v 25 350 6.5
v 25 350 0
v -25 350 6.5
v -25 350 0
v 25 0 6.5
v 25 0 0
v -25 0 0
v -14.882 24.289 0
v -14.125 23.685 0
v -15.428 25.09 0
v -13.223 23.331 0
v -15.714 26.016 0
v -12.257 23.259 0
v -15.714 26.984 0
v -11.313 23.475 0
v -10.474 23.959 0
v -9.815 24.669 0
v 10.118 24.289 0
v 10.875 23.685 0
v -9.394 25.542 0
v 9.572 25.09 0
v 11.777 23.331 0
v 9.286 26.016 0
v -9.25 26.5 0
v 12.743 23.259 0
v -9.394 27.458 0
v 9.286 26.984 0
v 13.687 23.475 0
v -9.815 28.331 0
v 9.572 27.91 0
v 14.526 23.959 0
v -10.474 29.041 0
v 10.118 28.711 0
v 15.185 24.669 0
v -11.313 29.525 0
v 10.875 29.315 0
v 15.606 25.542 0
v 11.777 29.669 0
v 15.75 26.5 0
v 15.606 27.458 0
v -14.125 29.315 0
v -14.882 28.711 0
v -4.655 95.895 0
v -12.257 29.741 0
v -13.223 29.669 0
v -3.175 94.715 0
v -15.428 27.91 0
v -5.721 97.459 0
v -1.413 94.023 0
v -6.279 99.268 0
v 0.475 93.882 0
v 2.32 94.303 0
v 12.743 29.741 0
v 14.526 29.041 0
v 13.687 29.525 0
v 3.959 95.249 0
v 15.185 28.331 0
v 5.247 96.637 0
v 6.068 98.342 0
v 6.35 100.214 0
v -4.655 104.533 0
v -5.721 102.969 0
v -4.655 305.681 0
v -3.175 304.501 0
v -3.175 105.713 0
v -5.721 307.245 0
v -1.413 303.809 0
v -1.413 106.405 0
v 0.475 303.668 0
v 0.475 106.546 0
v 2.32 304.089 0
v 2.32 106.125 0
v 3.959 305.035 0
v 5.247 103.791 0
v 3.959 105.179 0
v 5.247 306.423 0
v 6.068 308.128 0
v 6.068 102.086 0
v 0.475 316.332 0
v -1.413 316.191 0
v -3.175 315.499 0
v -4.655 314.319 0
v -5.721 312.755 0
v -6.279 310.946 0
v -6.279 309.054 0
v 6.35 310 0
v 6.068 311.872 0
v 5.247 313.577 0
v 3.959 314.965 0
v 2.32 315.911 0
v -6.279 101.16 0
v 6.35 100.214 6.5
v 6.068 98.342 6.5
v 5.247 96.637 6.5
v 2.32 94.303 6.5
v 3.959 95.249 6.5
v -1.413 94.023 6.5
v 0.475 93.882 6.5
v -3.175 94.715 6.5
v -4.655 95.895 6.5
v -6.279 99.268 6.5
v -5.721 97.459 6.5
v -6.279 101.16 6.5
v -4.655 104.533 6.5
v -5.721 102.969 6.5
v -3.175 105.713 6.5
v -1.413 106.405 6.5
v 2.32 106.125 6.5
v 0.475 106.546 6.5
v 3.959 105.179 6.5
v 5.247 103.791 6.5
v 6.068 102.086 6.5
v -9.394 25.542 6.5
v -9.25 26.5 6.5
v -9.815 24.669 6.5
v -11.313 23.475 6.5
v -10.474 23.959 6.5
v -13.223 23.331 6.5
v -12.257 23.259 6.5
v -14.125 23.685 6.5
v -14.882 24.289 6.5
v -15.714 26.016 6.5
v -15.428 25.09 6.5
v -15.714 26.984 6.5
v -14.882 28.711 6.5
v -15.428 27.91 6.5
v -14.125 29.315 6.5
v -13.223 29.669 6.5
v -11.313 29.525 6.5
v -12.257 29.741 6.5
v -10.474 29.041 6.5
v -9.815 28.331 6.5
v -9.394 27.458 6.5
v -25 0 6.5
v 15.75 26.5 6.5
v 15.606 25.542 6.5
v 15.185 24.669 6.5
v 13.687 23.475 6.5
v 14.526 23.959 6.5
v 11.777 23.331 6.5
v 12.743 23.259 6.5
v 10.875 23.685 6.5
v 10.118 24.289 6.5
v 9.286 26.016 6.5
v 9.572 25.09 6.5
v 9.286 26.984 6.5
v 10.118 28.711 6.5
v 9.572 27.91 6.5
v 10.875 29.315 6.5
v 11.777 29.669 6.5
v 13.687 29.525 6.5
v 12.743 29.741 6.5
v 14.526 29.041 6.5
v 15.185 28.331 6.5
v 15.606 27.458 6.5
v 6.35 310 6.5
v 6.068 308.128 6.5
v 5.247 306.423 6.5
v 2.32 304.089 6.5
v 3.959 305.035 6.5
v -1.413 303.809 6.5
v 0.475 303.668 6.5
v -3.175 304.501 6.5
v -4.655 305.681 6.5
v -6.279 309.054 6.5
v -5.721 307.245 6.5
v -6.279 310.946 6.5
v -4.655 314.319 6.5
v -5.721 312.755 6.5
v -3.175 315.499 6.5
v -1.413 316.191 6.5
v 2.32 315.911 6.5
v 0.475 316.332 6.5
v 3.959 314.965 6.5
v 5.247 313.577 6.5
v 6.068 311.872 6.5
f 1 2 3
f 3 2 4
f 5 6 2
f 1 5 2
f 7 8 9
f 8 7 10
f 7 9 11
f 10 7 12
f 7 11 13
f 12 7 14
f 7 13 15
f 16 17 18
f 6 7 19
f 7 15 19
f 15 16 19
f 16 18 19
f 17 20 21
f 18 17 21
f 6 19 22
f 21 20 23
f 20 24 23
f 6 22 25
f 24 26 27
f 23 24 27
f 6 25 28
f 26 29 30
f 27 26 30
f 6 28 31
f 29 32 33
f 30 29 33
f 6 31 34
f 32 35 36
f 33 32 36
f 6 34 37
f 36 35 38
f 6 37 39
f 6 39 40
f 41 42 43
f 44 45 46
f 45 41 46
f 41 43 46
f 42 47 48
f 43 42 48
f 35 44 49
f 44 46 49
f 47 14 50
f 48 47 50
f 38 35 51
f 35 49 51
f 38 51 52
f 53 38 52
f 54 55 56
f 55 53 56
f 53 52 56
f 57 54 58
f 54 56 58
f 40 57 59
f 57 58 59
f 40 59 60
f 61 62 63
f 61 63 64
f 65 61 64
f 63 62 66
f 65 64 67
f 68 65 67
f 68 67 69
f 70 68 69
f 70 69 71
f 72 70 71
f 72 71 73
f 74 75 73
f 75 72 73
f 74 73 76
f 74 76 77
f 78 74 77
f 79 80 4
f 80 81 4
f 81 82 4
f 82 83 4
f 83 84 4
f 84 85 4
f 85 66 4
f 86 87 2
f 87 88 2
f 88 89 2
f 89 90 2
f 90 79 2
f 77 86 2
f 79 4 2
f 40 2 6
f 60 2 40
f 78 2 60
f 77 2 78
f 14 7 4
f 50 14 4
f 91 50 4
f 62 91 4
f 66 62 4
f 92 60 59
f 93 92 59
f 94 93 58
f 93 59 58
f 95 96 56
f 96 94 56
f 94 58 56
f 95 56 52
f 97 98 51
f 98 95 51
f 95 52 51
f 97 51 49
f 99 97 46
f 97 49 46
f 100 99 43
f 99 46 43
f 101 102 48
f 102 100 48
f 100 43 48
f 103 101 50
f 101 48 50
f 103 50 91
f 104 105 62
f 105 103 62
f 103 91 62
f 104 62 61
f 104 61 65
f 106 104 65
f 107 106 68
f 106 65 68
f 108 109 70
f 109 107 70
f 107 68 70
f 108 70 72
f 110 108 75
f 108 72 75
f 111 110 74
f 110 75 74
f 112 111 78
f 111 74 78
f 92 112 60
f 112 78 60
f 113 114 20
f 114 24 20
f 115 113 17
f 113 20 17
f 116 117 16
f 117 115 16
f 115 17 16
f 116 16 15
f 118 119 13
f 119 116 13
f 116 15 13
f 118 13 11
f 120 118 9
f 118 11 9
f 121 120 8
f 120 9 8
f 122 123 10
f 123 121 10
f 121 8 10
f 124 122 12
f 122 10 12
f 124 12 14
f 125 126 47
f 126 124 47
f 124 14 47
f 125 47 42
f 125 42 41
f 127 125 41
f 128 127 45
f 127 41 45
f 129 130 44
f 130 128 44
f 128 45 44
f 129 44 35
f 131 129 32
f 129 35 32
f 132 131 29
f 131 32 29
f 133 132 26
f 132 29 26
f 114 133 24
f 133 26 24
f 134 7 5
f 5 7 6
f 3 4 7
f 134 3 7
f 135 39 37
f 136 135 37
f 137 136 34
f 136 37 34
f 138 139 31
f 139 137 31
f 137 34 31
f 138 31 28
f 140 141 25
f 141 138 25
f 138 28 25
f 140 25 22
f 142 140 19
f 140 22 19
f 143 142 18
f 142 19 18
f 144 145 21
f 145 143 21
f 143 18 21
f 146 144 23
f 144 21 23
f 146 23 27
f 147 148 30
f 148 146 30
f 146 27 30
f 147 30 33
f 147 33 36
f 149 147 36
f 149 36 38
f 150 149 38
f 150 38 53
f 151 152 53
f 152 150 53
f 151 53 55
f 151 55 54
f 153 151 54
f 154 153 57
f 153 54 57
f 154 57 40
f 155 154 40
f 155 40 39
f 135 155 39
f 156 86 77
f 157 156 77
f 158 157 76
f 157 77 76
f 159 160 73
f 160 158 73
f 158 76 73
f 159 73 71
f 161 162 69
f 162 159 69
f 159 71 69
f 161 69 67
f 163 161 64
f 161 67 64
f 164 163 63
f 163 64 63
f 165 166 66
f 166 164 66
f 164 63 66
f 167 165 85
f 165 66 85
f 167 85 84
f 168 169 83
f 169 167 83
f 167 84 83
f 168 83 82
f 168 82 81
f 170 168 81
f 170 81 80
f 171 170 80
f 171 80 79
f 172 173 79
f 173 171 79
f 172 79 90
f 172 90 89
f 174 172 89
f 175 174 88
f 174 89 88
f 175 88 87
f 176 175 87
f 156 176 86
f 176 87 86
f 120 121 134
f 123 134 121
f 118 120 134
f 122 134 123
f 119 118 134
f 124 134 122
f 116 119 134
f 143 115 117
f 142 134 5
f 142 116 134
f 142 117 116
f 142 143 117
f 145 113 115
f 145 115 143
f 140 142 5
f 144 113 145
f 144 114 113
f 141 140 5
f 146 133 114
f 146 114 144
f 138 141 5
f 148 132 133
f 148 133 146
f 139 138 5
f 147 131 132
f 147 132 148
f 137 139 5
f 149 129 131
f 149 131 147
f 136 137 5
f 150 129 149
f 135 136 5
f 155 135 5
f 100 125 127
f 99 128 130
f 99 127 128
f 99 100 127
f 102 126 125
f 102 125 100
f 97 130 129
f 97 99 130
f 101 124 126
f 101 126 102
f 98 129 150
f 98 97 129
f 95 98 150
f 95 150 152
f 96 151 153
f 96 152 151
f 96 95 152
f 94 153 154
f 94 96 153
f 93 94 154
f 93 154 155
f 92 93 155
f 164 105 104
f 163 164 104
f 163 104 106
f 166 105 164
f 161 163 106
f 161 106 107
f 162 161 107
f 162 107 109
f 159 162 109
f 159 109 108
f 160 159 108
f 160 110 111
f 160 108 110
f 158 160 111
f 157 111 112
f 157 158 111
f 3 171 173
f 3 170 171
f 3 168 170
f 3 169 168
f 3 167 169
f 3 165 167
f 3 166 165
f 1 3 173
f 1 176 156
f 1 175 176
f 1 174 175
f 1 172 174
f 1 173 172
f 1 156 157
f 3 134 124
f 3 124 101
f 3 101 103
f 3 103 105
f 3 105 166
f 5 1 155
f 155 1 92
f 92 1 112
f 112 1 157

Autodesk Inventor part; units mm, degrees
ref_plane "YZ Plane" through (0, 0, 0) normal (1, 0, 0) x (0, 1, 0)
ref_plane "XZ Plane" through (0, 0, 0) normal (0, 1, 0) x (-1, 0, 0)
ref_plane "XY Plane" through (0, 0, 0) normal (0, 0, 1) x (1, 0, 0)
sketch "Sketch1" plane through (0, 0, 0) normal (0, 0, 1) x (1, 0, 0)
  line L0 (-25, 0) -> (25, 0)
  line L1 (25, 0) -> (25, 350)
  line L2 (25, 350) -> (-25, 350)
  line L3 (-25, 350) -> (-25, 0)
  circle A0 centre (0, 100.214) radius 6.35
  circle A1 centre (0, 310) radius 6.35
  circle A2 centre (-12.5, 26.5) radius 3.25
  circle A3 centre (12.5, 26.5) radius 3.25
  point P0 (0, 0)
  dimension "d0" = 50
  dimension "d1" = 350
  dimension "d2" = 12.7
  dimension "d3" = 12.7
  dimension "d4" = 6.5
  dimension "d5" = 6.5
extrude "Extrusion1" add sketch "Sketch1" along normal blind 6.5
sketch "Sketch2" plane through (0, 0, 6.5) normal (0, 0, 1) x (1, 0, 0)
  point P0 (0, 0)
properties part number "Main Support"
